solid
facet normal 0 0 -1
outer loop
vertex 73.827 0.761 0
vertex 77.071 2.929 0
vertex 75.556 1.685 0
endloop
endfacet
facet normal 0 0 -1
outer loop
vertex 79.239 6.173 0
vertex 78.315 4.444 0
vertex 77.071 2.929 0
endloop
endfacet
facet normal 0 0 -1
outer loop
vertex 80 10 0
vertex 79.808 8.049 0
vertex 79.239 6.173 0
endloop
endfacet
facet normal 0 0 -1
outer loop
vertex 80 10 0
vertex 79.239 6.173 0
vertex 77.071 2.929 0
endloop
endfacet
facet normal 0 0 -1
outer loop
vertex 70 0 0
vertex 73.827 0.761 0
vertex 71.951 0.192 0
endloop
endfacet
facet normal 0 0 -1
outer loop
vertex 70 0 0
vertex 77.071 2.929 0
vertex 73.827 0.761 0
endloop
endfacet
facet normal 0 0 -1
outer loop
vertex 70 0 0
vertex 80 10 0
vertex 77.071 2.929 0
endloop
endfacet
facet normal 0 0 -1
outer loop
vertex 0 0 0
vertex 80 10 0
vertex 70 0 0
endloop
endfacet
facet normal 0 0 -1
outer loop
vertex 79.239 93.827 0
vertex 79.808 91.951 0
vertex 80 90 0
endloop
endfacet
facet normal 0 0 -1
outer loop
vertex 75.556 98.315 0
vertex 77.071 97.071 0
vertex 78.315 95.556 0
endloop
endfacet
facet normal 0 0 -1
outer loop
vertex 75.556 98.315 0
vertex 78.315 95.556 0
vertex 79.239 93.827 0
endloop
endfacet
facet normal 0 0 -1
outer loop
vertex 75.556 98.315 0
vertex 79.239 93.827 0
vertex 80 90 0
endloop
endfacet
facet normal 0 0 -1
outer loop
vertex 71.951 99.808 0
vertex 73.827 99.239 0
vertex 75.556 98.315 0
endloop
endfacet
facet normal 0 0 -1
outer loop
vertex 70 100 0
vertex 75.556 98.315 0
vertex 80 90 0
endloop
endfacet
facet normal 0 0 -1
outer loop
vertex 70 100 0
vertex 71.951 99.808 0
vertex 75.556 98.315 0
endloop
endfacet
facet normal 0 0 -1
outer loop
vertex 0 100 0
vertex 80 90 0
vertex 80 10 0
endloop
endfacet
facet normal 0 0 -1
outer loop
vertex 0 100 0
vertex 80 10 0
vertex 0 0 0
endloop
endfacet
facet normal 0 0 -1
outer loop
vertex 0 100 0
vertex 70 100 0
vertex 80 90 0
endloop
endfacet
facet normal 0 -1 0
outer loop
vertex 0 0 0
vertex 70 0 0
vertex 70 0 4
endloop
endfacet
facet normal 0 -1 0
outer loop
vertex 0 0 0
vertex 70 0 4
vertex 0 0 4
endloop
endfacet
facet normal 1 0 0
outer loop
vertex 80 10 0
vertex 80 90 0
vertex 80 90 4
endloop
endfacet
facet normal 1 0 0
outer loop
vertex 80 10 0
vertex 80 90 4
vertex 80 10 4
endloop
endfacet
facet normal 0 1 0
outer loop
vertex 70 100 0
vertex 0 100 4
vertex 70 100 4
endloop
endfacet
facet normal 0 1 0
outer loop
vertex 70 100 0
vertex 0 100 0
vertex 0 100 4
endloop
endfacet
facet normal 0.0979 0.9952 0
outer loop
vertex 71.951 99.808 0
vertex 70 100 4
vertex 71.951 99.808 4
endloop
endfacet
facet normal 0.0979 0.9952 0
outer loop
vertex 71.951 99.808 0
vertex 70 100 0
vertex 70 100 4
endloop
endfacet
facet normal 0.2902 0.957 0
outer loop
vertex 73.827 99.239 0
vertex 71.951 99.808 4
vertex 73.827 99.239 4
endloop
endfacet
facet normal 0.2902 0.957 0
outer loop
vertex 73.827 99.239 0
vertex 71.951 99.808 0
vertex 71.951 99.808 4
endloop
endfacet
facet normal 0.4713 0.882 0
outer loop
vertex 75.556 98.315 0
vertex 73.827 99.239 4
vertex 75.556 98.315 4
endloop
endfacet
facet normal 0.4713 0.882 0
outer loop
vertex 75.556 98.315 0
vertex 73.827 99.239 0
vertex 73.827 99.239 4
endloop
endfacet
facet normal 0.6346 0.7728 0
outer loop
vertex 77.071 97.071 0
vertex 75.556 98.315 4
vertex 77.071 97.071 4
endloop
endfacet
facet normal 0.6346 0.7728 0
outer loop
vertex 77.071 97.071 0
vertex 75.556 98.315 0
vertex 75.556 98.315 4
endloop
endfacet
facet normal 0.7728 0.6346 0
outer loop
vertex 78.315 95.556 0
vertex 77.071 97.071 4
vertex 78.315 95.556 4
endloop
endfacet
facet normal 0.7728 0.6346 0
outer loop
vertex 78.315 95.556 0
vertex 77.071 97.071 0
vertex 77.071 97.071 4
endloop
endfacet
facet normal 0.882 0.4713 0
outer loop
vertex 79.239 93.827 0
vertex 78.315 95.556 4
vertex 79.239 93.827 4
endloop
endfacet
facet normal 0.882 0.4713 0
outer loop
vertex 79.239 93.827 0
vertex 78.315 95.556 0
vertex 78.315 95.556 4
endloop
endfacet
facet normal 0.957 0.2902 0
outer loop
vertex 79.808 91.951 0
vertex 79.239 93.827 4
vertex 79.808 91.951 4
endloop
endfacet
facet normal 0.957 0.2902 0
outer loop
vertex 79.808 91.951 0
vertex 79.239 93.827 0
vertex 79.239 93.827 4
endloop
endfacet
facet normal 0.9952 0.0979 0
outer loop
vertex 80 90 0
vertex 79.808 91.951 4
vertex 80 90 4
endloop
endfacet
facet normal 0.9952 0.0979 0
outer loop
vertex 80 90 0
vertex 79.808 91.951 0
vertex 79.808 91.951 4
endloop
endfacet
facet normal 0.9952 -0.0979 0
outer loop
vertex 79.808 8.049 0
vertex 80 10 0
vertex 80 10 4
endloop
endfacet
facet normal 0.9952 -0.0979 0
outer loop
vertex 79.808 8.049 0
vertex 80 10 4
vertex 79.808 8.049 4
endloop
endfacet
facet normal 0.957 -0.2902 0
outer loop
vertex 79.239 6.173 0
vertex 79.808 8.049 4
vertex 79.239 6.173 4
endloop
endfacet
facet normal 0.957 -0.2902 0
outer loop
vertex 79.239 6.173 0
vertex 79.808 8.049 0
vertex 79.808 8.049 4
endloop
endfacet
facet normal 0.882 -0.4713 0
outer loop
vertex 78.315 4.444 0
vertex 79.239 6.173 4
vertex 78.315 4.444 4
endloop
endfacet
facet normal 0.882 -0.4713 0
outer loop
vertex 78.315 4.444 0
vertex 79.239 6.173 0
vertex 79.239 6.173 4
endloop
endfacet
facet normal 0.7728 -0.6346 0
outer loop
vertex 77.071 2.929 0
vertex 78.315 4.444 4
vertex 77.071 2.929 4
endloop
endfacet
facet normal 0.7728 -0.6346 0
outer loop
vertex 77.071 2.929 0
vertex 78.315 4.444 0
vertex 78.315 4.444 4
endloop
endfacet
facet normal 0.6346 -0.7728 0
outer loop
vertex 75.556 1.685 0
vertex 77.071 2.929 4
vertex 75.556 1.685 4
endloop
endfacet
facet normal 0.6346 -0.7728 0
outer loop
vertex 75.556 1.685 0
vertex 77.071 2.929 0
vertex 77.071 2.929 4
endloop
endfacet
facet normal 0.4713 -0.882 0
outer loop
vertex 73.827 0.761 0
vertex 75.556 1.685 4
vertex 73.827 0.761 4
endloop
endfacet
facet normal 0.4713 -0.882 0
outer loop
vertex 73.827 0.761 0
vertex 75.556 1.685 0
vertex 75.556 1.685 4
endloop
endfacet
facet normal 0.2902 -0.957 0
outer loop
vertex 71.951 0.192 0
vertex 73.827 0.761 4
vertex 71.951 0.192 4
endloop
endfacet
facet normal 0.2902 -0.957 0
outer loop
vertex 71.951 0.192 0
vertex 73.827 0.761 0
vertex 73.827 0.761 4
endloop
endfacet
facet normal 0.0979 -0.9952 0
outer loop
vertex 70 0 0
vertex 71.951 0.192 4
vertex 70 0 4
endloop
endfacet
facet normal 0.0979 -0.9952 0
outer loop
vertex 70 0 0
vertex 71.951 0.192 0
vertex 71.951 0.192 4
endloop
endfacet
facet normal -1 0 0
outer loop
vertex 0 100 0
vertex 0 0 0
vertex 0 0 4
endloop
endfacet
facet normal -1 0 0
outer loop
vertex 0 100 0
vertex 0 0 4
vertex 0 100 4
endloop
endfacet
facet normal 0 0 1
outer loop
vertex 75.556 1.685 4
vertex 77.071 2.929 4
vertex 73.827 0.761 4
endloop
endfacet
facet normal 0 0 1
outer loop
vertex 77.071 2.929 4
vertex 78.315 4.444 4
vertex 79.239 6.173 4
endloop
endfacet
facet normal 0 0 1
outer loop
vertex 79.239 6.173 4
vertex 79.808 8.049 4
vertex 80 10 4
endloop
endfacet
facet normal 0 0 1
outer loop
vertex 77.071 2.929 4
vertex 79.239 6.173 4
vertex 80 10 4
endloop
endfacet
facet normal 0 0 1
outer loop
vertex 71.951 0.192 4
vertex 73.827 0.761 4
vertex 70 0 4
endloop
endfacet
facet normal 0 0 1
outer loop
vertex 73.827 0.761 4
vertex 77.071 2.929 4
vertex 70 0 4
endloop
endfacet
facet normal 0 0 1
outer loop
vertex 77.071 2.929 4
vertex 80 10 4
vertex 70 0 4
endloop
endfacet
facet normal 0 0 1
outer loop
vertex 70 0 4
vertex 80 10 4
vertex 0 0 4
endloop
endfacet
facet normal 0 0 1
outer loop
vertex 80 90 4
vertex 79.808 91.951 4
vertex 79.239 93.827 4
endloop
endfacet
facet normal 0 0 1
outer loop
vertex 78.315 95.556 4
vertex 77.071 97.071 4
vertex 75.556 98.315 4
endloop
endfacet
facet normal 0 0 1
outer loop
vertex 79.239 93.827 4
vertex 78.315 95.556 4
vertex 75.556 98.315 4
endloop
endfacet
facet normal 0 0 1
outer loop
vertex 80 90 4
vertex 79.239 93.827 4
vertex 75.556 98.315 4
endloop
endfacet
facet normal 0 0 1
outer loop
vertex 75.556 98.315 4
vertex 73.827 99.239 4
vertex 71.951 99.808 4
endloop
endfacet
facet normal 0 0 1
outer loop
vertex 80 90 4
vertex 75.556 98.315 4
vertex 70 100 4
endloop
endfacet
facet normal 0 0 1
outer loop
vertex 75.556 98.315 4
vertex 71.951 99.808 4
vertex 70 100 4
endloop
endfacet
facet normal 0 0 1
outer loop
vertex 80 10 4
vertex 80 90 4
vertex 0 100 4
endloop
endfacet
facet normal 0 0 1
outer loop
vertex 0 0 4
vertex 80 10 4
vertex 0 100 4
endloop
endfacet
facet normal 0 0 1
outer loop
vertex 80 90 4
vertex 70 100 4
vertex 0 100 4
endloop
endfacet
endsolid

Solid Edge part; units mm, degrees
sketch "Sketch1" plane through (0, 0, 0) normal (0, 0, 1) x (1, 0, 0)
  line L0 (80, 90) -> (80, 10)
  arc A0 (80, 10) -> (70, 0) centre (70, 10) cw
  line L1 (70, 0) -> (0, 0)
  line L2 (0, 0) -> (0, 100)
  line L3 (0, 100) -> (70, 100)
  arc A1 (70, 100) -> (80, 90) centre (70, 90) cw
extrude "Protrusion1" add sketch "Sketch1" along normal blind 4
